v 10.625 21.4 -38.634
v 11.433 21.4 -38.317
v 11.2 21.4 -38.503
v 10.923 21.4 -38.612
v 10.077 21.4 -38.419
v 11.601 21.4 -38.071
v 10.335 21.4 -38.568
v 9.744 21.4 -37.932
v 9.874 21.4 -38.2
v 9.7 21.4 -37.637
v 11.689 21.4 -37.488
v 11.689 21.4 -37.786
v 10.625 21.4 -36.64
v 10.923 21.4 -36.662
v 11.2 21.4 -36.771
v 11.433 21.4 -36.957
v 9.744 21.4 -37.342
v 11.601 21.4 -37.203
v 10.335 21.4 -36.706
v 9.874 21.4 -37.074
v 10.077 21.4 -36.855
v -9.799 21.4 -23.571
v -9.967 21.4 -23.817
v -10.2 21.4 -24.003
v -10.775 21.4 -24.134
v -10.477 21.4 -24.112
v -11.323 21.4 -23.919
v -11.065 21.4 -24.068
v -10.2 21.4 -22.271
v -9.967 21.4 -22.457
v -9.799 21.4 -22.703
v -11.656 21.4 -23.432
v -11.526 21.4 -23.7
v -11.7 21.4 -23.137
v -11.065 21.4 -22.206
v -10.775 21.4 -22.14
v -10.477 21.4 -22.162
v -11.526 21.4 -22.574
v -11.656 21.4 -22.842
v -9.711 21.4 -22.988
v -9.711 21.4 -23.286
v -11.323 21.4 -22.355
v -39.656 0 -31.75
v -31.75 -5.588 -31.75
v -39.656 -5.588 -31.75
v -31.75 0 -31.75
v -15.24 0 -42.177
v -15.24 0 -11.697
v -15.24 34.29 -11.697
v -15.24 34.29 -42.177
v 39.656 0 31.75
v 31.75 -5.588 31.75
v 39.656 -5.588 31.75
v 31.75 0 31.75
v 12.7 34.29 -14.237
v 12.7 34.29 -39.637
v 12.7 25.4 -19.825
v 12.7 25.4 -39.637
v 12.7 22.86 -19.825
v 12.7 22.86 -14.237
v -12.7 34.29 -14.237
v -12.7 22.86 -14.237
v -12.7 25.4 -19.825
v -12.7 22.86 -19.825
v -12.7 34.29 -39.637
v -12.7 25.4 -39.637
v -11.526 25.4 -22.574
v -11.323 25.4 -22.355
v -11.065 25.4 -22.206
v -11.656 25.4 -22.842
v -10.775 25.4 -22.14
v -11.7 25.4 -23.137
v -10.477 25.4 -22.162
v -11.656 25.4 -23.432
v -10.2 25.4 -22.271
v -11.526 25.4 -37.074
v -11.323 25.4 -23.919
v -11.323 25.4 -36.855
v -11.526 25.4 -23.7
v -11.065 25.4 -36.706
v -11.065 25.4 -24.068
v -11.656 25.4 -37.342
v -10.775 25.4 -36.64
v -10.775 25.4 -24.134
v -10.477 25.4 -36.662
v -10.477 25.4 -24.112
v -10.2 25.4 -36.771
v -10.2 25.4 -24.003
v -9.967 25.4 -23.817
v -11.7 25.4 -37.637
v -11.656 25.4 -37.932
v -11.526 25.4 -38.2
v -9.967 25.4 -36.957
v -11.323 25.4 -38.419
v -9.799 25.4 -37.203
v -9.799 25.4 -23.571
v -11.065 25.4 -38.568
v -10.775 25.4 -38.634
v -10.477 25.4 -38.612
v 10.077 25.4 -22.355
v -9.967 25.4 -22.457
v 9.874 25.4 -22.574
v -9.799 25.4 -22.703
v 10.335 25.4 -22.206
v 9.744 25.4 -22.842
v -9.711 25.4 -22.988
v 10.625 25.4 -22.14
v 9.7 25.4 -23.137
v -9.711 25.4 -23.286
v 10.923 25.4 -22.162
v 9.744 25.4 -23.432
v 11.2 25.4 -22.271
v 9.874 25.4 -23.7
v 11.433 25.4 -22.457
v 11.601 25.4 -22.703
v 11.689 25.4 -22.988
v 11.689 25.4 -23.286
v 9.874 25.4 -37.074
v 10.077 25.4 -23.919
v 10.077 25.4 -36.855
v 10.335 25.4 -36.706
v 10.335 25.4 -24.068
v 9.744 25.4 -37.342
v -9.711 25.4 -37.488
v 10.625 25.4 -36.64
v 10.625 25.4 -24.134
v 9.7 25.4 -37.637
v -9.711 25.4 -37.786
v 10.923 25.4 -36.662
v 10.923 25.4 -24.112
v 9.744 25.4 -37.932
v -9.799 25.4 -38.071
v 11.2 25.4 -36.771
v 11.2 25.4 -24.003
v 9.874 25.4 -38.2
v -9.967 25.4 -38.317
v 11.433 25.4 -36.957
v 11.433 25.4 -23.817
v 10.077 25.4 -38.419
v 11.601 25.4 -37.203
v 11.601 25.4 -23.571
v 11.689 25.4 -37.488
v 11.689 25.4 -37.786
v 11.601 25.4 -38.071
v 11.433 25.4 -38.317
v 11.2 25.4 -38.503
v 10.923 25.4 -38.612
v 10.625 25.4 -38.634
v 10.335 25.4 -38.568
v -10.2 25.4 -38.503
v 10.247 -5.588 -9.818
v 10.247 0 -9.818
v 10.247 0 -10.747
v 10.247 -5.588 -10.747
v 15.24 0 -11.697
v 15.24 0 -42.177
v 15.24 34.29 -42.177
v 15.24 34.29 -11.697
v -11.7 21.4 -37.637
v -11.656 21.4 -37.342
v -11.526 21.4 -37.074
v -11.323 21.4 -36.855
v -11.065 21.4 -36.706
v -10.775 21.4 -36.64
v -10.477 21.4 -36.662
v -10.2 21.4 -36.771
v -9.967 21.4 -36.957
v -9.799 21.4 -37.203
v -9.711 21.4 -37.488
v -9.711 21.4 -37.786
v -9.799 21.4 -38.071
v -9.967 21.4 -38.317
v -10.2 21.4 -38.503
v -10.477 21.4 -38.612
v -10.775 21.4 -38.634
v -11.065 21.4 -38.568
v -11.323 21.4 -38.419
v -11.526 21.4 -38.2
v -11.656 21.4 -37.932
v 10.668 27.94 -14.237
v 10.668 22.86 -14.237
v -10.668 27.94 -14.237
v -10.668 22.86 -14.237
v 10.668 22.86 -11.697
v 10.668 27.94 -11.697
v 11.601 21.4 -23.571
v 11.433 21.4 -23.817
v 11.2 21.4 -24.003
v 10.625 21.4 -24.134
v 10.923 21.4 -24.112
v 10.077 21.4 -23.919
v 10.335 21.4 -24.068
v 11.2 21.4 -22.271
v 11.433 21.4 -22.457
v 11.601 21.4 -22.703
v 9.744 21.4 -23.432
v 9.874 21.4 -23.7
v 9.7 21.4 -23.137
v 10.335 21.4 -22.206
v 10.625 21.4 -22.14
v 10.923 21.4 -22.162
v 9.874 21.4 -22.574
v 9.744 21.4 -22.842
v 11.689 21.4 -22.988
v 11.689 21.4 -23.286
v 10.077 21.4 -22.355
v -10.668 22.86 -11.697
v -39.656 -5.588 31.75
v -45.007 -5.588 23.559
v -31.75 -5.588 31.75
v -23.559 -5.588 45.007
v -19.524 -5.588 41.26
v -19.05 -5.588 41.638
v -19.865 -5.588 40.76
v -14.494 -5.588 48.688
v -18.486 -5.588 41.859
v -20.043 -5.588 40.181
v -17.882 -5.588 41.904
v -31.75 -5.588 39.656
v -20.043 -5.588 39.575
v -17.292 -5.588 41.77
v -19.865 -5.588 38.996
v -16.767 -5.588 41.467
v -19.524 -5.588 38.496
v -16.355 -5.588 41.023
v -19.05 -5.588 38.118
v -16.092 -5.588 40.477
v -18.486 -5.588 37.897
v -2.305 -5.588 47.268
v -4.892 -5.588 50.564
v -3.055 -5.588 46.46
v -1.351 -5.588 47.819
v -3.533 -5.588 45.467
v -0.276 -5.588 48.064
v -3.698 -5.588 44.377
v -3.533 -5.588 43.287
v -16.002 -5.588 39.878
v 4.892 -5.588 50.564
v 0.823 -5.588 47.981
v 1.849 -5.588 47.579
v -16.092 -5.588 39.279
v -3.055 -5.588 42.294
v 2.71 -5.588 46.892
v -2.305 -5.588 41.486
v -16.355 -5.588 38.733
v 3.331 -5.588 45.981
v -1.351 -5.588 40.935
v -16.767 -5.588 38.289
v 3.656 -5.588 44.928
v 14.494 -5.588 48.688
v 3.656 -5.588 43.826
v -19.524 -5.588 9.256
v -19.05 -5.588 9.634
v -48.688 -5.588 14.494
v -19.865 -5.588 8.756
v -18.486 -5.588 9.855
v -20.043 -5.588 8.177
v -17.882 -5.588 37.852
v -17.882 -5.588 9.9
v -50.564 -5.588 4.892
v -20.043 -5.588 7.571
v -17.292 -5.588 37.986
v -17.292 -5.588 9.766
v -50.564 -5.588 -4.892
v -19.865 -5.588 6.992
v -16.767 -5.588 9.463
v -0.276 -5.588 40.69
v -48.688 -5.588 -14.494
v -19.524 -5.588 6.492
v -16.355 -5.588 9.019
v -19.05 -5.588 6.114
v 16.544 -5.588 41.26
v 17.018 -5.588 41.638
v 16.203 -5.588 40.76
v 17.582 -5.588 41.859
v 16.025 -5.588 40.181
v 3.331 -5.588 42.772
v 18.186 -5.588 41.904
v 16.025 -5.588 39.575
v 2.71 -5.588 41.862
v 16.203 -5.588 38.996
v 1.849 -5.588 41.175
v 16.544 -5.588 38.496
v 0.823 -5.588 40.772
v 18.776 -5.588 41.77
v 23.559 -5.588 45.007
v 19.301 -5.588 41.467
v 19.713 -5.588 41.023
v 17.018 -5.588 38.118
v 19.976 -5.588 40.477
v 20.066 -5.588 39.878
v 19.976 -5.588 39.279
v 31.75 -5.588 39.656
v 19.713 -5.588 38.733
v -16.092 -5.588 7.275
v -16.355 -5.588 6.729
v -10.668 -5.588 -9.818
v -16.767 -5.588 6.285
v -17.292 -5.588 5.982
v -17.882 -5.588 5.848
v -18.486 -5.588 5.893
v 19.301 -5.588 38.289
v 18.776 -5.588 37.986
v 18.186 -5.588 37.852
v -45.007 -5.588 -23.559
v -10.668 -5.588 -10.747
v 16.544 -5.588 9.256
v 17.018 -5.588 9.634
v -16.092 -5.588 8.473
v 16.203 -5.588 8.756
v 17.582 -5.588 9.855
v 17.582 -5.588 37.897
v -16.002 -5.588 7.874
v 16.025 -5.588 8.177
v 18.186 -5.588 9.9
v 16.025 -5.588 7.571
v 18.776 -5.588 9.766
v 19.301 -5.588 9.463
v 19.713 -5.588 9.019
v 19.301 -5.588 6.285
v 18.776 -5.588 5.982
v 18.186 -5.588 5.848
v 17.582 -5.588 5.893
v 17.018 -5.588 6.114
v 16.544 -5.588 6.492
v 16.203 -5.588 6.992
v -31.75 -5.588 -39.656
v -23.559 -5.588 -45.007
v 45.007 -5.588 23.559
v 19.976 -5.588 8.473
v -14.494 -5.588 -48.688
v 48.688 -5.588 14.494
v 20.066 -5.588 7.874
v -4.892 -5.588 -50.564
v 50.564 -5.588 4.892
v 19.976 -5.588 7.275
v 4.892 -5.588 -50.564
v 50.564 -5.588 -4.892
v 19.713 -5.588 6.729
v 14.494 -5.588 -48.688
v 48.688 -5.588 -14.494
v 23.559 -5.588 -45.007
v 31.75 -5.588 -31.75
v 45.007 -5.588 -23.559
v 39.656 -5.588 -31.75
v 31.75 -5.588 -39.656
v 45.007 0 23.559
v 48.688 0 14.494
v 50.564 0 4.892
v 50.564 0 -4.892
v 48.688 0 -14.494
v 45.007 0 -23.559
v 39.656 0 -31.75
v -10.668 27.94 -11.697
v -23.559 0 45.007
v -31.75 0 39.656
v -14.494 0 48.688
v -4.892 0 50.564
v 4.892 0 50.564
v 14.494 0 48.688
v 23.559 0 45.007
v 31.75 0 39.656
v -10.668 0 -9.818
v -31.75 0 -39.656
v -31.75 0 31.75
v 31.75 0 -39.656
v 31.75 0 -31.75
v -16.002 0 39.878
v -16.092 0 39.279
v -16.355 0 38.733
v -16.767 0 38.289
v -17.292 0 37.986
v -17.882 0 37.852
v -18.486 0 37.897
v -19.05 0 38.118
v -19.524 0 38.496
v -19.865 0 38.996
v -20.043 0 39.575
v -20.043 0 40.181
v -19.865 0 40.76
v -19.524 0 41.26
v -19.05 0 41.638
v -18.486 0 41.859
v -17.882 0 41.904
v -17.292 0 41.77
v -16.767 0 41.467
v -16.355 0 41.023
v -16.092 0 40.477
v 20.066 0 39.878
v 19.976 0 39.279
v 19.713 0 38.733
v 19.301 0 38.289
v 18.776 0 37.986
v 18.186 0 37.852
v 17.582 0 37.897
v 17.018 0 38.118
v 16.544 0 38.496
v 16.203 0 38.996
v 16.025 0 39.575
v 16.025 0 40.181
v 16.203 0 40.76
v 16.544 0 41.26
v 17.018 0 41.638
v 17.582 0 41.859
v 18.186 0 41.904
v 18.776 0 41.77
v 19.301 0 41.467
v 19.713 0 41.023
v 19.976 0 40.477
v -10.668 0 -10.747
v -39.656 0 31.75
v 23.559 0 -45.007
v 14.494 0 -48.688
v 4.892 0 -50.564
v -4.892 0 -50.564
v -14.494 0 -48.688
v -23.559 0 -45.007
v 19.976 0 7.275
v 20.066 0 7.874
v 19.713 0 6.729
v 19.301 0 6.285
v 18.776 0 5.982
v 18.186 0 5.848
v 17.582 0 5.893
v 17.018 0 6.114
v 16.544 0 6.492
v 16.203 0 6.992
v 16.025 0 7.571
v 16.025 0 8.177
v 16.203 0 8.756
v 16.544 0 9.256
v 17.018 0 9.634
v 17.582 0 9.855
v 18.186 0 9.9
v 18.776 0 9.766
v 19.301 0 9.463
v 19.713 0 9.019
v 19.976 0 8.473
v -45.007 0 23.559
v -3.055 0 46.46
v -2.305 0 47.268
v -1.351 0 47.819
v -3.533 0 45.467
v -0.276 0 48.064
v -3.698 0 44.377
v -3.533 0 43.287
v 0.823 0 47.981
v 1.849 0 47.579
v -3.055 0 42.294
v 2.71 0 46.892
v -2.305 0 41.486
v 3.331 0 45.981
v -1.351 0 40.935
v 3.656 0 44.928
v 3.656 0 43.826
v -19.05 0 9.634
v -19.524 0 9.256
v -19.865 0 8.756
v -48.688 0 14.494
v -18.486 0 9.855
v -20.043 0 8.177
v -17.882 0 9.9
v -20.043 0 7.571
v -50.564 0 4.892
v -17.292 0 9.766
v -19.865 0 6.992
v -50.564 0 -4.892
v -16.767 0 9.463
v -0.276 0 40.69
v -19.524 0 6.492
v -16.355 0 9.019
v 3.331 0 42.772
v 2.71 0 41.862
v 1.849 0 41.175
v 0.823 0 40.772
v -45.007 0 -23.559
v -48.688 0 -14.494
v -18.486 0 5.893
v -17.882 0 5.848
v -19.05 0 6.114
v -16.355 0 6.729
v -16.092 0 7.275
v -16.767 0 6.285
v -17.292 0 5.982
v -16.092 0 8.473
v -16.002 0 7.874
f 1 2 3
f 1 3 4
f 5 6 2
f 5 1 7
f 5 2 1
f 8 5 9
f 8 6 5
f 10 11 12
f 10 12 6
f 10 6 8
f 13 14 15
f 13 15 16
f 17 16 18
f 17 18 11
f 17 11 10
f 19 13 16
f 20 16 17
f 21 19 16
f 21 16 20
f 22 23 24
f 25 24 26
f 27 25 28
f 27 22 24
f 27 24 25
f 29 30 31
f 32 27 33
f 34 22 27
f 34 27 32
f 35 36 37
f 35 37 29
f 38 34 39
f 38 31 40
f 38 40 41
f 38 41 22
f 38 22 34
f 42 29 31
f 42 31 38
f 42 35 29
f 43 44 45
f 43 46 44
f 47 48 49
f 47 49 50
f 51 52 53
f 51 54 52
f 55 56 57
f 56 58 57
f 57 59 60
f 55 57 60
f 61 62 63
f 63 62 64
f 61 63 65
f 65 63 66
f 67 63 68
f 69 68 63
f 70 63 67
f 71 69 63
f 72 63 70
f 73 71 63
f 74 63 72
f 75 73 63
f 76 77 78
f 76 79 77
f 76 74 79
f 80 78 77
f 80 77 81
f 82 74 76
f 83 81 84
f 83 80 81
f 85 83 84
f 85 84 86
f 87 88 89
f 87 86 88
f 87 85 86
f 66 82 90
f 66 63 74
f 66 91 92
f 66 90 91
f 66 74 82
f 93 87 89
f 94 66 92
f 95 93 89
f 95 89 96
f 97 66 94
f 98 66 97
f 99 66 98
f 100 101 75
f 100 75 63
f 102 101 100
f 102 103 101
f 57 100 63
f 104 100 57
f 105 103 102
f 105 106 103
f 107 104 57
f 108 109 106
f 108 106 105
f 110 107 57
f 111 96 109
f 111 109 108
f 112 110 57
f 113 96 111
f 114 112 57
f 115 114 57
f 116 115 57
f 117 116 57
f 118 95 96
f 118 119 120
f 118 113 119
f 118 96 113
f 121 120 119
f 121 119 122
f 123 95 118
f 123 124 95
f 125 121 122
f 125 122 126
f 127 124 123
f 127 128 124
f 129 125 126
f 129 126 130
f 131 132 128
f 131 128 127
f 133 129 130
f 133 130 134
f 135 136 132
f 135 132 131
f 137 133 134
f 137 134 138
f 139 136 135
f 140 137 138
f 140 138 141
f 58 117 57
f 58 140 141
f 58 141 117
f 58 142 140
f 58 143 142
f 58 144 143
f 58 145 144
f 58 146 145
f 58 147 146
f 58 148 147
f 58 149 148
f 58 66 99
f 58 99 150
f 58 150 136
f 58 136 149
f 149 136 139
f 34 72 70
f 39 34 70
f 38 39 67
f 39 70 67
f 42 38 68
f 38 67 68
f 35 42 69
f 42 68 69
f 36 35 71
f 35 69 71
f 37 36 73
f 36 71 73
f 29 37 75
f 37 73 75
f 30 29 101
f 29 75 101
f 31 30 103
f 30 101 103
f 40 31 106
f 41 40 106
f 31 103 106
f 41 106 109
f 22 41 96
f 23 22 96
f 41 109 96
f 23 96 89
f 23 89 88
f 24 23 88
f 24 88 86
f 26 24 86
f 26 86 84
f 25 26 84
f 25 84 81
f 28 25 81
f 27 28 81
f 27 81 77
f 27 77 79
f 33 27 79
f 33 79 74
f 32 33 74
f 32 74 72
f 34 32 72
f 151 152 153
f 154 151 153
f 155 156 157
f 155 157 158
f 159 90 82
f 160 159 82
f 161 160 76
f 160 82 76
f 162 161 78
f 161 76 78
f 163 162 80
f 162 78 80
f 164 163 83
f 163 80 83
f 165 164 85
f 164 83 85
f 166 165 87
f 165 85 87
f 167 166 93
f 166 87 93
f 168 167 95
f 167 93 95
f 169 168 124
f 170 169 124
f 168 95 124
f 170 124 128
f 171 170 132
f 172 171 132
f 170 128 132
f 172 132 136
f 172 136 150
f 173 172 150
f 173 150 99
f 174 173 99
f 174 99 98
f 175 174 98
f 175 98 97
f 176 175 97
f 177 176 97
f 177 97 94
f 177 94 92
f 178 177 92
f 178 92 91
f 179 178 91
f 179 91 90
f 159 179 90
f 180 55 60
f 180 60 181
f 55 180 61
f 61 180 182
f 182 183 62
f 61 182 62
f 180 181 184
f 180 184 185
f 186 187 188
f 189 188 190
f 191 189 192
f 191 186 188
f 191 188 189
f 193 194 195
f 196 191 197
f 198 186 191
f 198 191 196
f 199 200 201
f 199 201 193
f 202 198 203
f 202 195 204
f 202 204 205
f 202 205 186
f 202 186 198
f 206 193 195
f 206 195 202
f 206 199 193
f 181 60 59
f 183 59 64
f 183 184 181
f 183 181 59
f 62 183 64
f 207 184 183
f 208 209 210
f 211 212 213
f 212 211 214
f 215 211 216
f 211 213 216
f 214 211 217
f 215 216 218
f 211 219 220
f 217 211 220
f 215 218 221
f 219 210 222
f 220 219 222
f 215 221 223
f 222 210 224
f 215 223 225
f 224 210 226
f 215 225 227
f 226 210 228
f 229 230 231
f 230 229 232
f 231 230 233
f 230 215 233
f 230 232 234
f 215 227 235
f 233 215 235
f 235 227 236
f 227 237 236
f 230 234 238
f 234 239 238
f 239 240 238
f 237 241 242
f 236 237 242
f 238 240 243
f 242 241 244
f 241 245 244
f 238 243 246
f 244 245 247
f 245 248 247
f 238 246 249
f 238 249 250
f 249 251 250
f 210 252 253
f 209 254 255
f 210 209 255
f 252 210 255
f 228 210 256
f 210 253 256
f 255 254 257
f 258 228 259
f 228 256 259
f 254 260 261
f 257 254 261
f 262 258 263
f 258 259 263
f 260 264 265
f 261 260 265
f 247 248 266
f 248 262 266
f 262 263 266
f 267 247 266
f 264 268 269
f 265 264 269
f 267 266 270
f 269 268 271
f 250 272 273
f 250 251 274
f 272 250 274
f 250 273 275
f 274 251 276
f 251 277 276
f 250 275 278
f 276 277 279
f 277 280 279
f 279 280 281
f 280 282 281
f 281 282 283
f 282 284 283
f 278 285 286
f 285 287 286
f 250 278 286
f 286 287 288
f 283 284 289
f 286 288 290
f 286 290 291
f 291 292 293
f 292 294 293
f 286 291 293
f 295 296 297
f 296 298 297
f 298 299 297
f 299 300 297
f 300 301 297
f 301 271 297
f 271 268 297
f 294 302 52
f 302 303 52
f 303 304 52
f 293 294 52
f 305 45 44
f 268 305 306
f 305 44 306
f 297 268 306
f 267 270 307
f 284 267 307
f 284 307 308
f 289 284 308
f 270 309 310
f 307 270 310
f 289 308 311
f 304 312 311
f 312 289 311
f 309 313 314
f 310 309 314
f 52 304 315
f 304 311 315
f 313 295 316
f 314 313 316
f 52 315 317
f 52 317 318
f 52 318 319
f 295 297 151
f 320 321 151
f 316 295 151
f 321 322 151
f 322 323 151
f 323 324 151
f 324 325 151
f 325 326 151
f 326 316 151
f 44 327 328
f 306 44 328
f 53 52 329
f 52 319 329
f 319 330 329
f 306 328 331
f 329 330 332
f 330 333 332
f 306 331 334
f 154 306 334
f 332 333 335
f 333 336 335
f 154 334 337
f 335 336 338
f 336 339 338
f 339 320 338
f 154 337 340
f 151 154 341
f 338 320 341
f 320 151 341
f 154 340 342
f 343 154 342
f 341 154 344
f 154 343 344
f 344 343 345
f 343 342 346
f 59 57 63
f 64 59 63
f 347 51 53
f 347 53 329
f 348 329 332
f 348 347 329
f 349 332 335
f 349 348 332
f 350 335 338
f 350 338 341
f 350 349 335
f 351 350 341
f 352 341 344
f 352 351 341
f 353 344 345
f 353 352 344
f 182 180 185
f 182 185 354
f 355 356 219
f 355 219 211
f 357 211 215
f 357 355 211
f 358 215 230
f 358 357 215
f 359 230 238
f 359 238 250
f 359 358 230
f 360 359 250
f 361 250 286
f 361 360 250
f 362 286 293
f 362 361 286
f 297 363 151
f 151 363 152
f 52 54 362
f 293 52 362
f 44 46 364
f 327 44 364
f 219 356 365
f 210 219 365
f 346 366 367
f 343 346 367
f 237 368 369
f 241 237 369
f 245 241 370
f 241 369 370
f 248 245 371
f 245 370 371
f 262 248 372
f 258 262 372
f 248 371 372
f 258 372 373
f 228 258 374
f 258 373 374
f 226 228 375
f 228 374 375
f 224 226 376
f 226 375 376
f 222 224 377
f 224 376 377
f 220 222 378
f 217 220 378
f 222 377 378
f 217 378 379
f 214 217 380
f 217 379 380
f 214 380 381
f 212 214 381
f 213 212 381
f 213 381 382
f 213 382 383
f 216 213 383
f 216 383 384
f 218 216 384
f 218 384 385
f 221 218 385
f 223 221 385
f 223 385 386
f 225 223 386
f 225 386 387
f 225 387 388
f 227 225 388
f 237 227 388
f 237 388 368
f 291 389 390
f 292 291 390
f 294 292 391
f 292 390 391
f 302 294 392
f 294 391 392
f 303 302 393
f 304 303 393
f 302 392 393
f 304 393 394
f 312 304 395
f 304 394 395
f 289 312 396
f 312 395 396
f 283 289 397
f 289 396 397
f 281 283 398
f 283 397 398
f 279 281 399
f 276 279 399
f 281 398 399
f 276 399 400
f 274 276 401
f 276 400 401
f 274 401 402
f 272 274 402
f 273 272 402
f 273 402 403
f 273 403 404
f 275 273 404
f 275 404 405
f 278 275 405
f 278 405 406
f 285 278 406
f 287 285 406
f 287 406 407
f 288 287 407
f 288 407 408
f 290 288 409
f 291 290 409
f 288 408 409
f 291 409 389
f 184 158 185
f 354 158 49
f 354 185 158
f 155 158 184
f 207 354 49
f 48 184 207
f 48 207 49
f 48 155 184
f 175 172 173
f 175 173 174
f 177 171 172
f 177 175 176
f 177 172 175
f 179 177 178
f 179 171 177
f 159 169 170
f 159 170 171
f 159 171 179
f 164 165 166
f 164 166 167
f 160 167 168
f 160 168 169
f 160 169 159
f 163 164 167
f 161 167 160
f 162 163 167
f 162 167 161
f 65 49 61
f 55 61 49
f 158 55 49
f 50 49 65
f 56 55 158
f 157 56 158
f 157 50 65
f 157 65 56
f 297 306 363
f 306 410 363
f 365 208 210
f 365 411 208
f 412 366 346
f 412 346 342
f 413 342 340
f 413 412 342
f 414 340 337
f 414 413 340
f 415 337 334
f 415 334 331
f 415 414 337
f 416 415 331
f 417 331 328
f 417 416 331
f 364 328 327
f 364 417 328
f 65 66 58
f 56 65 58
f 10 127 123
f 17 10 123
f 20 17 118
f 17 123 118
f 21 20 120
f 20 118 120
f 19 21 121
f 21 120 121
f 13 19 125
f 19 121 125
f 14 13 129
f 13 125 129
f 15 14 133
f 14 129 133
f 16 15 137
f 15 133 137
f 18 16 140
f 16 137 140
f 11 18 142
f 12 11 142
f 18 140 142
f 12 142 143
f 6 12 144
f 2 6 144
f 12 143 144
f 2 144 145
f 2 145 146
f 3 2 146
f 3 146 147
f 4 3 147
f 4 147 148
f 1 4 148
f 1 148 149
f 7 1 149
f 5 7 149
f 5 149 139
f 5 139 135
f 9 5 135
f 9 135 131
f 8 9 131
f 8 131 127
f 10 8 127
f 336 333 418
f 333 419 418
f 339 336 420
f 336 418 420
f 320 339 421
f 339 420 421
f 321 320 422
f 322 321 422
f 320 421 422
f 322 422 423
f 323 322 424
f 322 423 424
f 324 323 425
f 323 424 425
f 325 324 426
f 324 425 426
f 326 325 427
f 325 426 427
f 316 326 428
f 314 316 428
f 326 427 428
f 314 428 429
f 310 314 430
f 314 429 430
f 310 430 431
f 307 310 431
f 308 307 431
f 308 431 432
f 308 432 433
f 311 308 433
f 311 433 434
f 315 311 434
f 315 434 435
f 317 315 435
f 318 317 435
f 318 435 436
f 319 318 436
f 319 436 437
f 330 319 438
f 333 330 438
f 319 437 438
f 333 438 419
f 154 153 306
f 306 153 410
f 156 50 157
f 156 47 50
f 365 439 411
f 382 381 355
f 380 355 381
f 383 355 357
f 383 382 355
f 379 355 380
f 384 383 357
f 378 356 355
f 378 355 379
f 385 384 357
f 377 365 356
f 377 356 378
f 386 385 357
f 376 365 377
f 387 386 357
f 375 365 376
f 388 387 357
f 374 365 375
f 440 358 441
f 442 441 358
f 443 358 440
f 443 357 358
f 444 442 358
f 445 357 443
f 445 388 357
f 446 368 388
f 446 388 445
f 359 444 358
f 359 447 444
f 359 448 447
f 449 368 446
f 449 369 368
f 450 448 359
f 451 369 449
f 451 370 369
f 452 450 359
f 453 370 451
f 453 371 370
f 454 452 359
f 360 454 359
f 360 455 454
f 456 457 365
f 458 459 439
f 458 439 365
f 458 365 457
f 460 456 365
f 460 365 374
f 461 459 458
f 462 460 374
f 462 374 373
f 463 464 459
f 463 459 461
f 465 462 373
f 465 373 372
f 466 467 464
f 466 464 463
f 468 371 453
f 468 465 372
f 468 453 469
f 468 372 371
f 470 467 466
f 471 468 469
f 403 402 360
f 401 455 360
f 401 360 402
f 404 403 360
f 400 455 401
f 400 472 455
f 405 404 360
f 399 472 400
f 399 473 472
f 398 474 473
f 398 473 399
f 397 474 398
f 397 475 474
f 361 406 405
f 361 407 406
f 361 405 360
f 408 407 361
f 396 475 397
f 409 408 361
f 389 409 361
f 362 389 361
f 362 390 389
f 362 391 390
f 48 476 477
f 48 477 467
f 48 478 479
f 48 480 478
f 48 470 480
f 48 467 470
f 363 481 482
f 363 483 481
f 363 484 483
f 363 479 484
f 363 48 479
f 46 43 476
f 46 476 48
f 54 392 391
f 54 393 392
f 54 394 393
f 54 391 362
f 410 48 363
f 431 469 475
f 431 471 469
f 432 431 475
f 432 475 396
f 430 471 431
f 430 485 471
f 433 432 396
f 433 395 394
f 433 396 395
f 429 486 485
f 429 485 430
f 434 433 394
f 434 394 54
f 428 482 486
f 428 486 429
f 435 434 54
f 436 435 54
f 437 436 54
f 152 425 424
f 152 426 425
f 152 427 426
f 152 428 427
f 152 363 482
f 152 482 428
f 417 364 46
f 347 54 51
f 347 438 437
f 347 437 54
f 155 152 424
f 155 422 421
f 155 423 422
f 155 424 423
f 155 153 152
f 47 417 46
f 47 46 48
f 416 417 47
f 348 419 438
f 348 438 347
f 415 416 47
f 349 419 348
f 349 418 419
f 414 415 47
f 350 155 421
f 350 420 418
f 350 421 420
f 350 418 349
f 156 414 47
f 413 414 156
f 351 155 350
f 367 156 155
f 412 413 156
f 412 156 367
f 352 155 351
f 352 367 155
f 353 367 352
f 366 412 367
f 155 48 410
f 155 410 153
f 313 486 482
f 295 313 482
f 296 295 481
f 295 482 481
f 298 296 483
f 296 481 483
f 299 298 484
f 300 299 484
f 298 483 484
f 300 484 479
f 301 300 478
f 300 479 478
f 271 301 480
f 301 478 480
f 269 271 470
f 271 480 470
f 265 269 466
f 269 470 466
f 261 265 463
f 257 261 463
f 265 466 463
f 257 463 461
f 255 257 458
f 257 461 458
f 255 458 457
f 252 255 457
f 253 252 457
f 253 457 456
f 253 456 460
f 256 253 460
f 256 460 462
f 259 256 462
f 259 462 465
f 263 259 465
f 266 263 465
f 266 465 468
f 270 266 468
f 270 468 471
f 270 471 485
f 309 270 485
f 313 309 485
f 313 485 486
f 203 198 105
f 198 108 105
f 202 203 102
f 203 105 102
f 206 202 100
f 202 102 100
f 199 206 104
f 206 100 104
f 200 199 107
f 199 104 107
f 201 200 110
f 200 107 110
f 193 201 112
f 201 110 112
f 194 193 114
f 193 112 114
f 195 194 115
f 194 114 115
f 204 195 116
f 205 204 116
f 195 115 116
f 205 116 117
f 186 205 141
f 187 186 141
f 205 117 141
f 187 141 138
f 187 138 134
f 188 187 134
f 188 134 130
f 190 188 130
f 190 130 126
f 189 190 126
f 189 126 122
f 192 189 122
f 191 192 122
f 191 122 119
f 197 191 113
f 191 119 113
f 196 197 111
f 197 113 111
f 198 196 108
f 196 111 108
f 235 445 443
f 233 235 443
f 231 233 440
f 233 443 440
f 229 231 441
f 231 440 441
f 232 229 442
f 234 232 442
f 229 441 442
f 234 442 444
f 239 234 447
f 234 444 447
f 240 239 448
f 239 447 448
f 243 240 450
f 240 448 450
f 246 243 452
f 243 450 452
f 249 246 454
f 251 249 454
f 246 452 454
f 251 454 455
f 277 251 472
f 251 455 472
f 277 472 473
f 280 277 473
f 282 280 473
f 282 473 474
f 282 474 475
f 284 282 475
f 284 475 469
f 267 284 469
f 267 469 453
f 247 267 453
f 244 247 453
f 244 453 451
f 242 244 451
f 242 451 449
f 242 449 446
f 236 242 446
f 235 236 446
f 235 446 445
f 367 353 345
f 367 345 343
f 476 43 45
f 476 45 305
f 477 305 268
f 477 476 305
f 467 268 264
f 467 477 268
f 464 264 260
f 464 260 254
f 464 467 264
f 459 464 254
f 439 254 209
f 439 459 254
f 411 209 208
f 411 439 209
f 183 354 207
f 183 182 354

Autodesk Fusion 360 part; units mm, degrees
sketch "Sketch1" plane through (0, 0, 0) normal (0, 1, 0) x (1, 0, 0)
  arc A0 (31.75, 39.6557) -> (-31.75, 39.6557) centre (0, 0) ccw
  arc A1 (39.6557, -31.75) -> (39.6557, 31.75) centre (0, 0) ccw
  arc A2 (-39.6557, 31.75) -> (-39.6557, -31.75) centre (0, 0) ccw
  arc A3 (-31.75, -39.6557) -> (31.75, -39.6557) centre (0, 0) ccw
  line L0 (-31.75, -39.6557) -> (-31.75, -31.75)
  line L1 (-31.75, 31.75) -> (-31.75, 39.6557)
  line L2 (39.6557, 31.75) -> (31.75, 31.75)
  line L3 (-31.75, 31.75) -> (-39.6557, 31.75)
  line L4 (31.75, 39.6557) -> (31.75, 31.75)
  line L5 (31.75, -31.75) -> (31.75, -39.6557)
  line L6 (-39.6557, -31.75) -> (-31.75, -31.75)
  line L7 (31.75, -31.75) -> (39.6557, -31.75)
  dimension "d1" = 101.6
sketch "Sketch2" plane through (0, 0, 0) normal (0, 1, 0) x (1, 0, 0)
  circle A0 centre (-18.034, -7.874) radius 2.032
  circle A1 centre (18.034, -7.874) radius 2.032
  circle A2 centre (-18.034, -39.878) radius 2.032
  circle A3 centre (18.034, -39.878) radius 2.032
  dimension "d9" = 36.068
  dimension "d11" = 32.004
  dimension "d12" = 36.068
  dimension "d13" = 4.064
  dimension "d14" = 4.064
  dimension "d15" = 4.064
  dimension "d16" = 4.064
extrude "Extrude1" add sketch "Sketch1" against normal blind 5.588
sketch "Sketch4" plane through (0, 0, 0) normal (0, 1, 0) x (1, 0, 0)
  circle A0 centre (18.034, -39.878) radius 2.032
  line L0 (12.7, 39.6369) -> (12.7, 14.2369)
  line L1 (15.24, 11.6969) -> (-15.24, 11.6969)
  line L2 (-12.7, 14.2369) -> (-12.7, 39.6369)
  line L3 (15.24, 42.1769) -> (15.24, 11.6969)
  line L4 (12.7, 14.2369) -> (-12.7, 14.2369)
  circle A1 centre (18.034, -7.874) radius 2.032
  line L5 (-15.24, 42.1769) -> (15.24, 42.1769)
  circle A2 centre (-18.034, -39.878) radius 2.032
  line L6 (-12.7, 39.6369) -> (12.7, 39.6369)
  circle A3 centre (-18.034, -7.874) radius 2.032
  line L7 (-15.24, 11.6969) -> (-15.24, 42.1769)
  dimension "d29" = 36.068
  dimension "d30" = 32.004
  dimension "d31" = 36.068
  dimension "d32" = 4.064
  dimension "d33" = 4.064
  dimension "d34" = 4.064
  dimension "d35" = 4.064
extrude "Extrude2" cut sketch "Sketch2" against normal blind 22
extrude "Extrude3" add sketch "Sketch4" along normal blind 34.29 contours L1 L3 L5 L7
extrude "Extrude4" add 1 faces at (-4.2333, 0, -31.1702) along direction (0, 1, 0) blind 25.4
sketch "Sketch5" plane through (0, 25.4, 0) normal (0, 1, 0) x (-1, 0, 0)
  line L0 (12.7, -14.2369) -> (-12.7, -14.2369)
  line L1 (-12.7, -14.2369) -> (-12.7, -39.6369)
  line L2 (-12.7, -39.6369) -> (12.7, -39.6369)
  line L3 (12.7, -39.6369) -> (12.7, -14.2369)
  line L4 (12.7, -14.2369) -> (-12.7, -14.2369)
  line L5 (-12.7, -14.2369) -> (-12.7, -19.8249)
  line L6 (-12.7, -19.8249) -> (12.7, -19.8249)
  line L7 (12.7, -19.8249) -> (12.7, -14.2369)
  dimension "d42" = 5.588
extrude "Extrude5" cut sketch "Sketch5" against normal blind 2.54 contours L0 L1 L3 L4 L5 L6 L7
sketch "Sketch6" plane through (0, 0, -14.2369) normal (0, 0, -1) x (-1, 0, 0)
  line L0 (12.7, 22.86) -> (12.7, 34.29)
  line L1 (12.7, 34.29) -> (-12.7, 34.29)
  line L2 (-12.7, 34.29) -> (-12.7, 22.86)
  line L3 (-12.7, 22.86) -> (12.7, 22.86)
  line L4 (-10.668, 27.94) -> (10.668, 27.94)
  line L5 (10.668, 27.94) -> (10.668, 22.86)
  line L6 (10.668, 22.86) -> (-10.668, 22.86)
  line L7 (-10.668, 22.86) -> (-10.668, 27.94)
extrude "Extrude6" cut sketch "Sketch6" against normal blind 17 contours L3 L4 L5 L6 L7
sketch "Sketch7" plane through (0, 0, -11.6969) normal (0, 0, 1) x (1, 0, 0)
  line L0 (-10.668, 22.86) -> (-10.668, 27.94)
  line L1 (-10.668, 27.94) -> (10.668, 27.94)
  line L2 (10.668, 27.94) -> (10.668, 22.86)
  line L3 (10.668, 22.86) -> (-10.668, 22.86)
  line L4 (-15.24, 0) -> (15.24, 0)
  line L5 (15.24, 0) -> (15.24, 34.29)
  line L6 (15.24, 34.29) -> (-15.24, 34.29)
  line L7 (-15.24, 34.29) -> (-15.24, 0)
sketch "Sketch8" plane through (0, 25.4, 0) normal (0, 1, 0) x (-1, 0, 0)
  line L0 (12.7, -19.8249) -> (-12.7, -19.8249)
  line L1 (-12.7, -19.8249) -> (-12.7, -39.6369)
  line L2 (-12.7, -39.6369) -> (12.7, -39.6369)
  line L3 (12.7, -39.6369) -> (12.7, -19.8249)
  circle A0 centre (10.7, -37.6369) radius 1
  circle A1 centre (-10.7, -37.6369) radius 1
  circle A2 centre (10.7, -23.1369) radius 1
  circle A3 centre (-10.7, -23.1369) radius 1
  dimension "d53" = 2
  dimension "d54" = 2
  dimension "d56" = 2
  dimension "d57" = 2
extrude "Extrude7" cut sketch "Sketch8" against normal blind 4 contours A0 | A1 | A2 | A3
sketch "Sketch9" plane through (0, 0, 0) normal (0, 1, 0) x (-1, 0, 0)
  arc A0 (31.75, 39.6557) -> (-31.75, 39.6557) centre (0, 0) ccw
  line L0 (-31.75, 39.6557) -> (-31.75, 31.75)
  line L1 (-31.75, 31.75) -> (-39.6557, 31.75)
  arc A1 (-39.6557, 31.75) -> (-39.6557, -31.75) centre (0, 0) ccw
  line L2 (-39.6557, -31.75) -> (-31.75, -31.75)
  line L3 (-31.75, -31.75) -> (-31.75, -39.6557)
  arc A2 (-31.75, -39.6557) -> (31.75, -39.6557) centre (0, 0) ccw
  line L4 (31.75, -39.6557) -> (31.75, -31.75)
  line L5 (31.75, -31.75) -> (39.6557, -31.75)
  arc A3 (39.6557, -31.75) -> (39.6557, 31.75) centre (0, 0) ccw
  line L6 (39.6557, 31.75) -> (31.75, 31.75)
  line L7 (31.75, 31.75) -> (31.75, 39.6557)
  circle A4 centre (18.034, 7.874) radius 2.032
  circle A5 centre (18.034, 39.878) radius 2.032
  circle A6 centre (-18.034, 7.874) radius 2.032
  circle A7 centre (-18.034, 39.878) radius 2.032
  line L8 (15.24, -11.6969) -> (15.24, -42.1769)
  line L9 (15.24, -42.1769) -> (-15.24, -42.1769)
  line L10 (-15.24, -42.1769) -> (-15.24, -11.6969)
  line L11 (-15.24, -11.6969) -> (15.24, -11.6969)
  circle A8 centre (0, 44.3767) radius 3.6975
extrude "Extrude8" cut sketch "Sketch9" against normal blind 17 contours A8
sketch "Sketch10" plane through (0, 0, 0) normal (0, 1, 0) x (1, 0, 0)
  line L0 (-15.24, 11.6969) -> (15.24, 11.6969)
  line L1 (15.24, 10.2652) -> (14.8192, 10.2652)
  line L2 (10.668, 14.2369) -> (10.668, 11.6969)
  line L3 (-10.668, 9.8177) -> (10.2472, 9.8177)
  line L4 (10.2472, 9.8177) -> (10.2472, 10.7473)
  line L5 (10.2472, 10.7473) -> (-10.668, 10.7473)
  line L6 (-10.668, 10.7473) -> (-10.668, 9.8177)
  point P0 (-15.24, 11.6969)
extrude "Extrude9" cut sketch "Sketch10" against normal blind 14
